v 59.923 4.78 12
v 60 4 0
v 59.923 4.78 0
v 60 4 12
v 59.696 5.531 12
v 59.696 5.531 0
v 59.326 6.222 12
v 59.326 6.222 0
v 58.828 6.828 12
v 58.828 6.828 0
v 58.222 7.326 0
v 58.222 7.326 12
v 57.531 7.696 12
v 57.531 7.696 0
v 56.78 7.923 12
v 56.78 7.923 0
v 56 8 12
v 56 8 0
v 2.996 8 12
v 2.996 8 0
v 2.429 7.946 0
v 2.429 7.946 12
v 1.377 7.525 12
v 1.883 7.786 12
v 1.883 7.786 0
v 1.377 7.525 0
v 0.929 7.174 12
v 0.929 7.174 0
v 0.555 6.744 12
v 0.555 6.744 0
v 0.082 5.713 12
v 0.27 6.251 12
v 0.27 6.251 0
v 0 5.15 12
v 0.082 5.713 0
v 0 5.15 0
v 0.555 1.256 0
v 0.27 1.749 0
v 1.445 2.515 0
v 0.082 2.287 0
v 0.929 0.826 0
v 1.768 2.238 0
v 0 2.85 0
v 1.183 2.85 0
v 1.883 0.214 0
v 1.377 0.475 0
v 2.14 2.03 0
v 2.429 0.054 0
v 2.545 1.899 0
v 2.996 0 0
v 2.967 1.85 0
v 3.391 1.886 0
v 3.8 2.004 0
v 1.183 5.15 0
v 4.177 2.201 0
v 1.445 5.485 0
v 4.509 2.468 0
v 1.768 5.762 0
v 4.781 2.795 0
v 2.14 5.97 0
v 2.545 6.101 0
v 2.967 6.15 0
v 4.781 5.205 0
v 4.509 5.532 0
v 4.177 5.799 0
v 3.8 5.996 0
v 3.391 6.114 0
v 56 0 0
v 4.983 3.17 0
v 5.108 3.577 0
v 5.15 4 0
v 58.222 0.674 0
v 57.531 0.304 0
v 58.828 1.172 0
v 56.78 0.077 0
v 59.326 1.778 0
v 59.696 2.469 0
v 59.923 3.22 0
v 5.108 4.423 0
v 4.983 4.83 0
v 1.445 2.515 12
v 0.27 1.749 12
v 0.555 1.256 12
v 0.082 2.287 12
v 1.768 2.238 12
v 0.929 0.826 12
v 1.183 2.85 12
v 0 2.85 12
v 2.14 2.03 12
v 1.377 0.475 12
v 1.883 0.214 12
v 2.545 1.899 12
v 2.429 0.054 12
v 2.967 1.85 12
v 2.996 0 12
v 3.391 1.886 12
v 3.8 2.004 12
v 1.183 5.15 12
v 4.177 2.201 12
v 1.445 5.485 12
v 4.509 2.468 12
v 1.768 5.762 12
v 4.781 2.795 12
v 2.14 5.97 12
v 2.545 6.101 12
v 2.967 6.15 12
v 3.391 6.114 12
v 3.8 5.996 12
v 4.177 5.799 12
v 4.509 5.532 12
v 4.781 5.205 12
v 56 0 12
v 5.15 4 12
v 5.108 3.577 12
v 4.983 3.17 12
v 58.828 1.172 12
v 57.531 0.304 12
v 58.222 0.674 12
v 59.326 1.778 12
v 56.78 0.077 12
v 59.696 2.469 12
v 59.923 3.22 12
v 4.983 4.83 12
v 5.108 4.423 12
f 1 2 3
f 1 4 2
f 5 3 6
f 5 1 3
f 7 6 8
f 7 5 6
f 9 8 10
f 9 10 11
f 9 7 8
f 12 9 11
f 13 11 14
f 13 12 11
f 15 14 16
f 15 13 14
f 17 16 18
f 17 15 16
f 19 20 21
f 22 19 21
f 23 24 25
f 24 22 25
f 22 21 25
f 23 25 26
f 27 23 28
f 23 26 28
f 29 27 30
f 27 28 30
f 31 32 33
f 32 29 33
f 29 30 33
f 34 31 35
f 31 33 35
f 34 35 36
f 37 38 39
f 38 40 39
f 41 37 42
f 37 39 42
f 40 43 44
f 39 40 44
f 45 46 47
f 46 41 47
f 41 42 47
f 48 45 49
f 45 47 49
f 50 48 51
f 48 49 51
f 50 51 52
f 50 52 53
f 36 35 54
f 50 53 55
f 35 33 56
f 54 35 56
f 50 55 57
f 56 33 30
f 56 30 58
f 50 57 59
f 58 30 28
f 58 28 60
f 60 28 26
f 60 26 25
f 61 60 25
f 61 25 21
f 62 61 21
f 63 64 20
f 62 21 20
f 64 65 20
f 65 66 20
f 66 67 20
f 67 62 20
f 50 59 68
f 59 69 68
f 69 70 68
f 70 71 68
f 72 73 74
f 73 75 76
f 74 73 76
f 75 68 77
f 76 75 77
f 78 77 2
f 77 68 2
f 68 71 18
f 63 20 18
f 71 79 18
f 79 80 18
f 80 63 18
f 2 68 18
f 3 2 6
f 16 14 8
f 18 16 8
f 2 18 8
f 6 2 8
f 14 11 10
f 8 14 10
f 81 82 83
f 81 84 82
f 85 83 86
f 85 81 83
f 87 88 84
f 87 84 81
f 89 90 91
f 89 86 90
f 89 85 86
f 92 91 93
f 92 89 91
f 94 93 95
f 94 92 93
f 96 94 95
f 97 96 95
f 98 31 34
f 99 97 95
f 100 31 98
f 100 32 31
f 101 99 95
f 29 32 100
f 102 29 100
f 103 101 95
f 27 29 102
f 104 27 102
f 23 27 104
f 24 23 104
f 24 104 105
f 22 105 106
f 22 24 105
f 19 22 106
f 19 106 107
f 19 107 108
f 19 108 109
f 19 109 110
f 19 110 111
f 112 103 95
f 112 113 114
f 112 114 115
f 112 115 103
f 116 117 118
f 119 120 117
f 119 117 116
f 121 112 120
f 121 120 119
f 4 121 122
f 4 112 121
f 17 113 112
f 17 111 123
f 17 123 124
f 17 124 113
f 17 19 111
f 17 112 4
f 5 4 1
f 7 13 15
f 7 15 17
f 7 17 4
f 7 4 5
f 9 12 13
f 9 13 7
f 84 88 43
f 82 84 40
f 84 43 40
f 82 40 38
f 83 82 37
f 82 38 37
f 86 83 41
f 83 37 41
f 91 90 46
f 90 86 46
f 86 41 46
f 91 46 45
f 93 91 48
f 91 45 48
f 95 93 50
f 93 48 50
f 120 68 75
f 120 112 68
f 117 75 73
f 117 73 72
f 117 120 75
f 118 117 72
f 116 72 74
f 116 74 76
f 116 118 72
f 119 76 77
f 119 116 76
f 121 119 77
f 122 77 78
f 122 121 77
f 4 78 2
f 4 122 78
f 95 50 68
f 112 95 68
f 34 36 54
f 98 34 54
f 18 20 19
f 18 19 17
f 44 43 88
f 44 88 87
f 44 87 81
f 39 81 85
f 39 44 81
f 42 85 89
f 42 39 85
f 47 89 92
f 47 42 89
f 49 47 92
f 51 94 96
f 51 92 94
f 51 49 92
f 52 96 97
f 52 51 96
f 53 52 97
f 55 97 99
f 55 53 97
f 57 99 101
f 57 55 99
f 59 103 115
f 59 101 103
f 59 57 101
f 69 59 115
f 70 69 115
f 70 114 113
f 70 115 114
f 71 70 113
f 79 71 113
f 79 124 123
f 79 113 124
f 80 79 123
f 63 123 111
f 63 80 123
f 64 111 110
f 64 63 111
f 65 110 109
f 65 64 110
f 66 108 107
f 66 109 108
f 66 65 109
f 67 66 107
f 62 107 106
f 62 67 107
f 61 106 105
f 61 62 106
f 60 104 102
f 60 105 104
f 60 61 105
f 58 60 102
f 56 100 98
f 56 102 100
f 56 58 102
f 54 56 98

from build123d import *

# Parameters (mm, degrees)
ESQUISSE1_W                  = 60
ESQUISSE1_H                  = 8
BOSS_EXTRU_1_DEPTH           = 12
ENL_V_MAT_EXTRU_1_DEPTH      = 62.708994482
ENL_V_MAT_EXTRU_1_DEPTH_BACK = 62.708994482
ESQUISSE2_R                  = 2.15
ENL_V_MAT_EXTRU_2_DEPTH      = 62.708994482
ENL_V_MAT_EXTRU_2_DEPTH_BACK = 62.708994482
ESQUISSE3_W                  = 2
ESQUISSE3_H                  = 2.3
CONG_1_R                     = 4
CONG_2_R                     = 3


# Some blends are built 0.0001 mm under size
with BuildPart() as part:
    # Esquisse1 → Boss.-Extru.1 (new body)
    with BuildSketch(Plane.XY):
        with Locations((30, 4)):
            Rectangle(ESQUISSE1_W, ESQUISSE1_H)
    extrude(amount=BOSS_EXTRU_1_DEPTH)

    # Esquisse2 → Enlèv. mat.-Extru.1 (cut, two sides: drawn at the far end of the back side and taken through both)
    with BuildSketch(Plane.XY.offset(12).offset(-ENL_V_MAT_EXTRU_1_DEPTH_BACK)):
        with Locations((3, 4)):
            Circle(ESQUISSE2_R)
    extrude(amount=ENL_V_MAT_EXTRU_1_DEPTH + ENL_V_MAT_EXTRU_1_DEPTH_BACK, mode=Mode.SUBTRACT)

    # Esquisse3 → Enlèv. mat.-Extru.2 (cut, two sides: drawn at the far end of the back side and taken through both)
    with BuildSketch(Plane.XY.offset(12).offset(-ENL_V_MAT_EXTRU_2_DEPTH_BACK)):
        with Locations((1, 4)):
            Rectangle(ESQUISSE3_W, ESQUISSE3_H)
    extrude(amount=ENL_V_MAT_EXTRU_2_DEPTH + ENL_V_MAT_EXTRU_2_DEPTH_BACK, mode=Mode.SUBTRACT)

    # Congé1
    cong_1_edges = [part.edges().sort_by_distance(p)[0] for p in [
        (60, 0, 6),
        (60, 8, 6),
    ]]
    fillet(cong_1_edges, radius=CONG_1_R - 0.0001)  # a hair under: the kernel refuses the full size

    # Congé2
    # the kernel refuses this fillet: 3 mm, written as the material it takes off along each edge
    with BuildSketch(Plane(origin=(0, 0, -7.490619133), x_dir=(1, 0, 0), z_dir=(0, 0, 1))) as cong_2_piece_1:
        with BuildLine():
            CenterArc((2.996247653, 3), CONG_2_R, 182.865983983, 87.134016017)
            Line((0, 2.85), (-0.059924953, 2.847))
            ThreePointArc((-0.059924953, 2.847), (-0.06, 1.425), (-0.06, 0))
            Line((-0.06, 0), (0, -0.06))
            Line((0, -0.06), (2.996247653, -0.06))
            Line((2.996247653, -0.06), (2.996247653, 0))
        make_face()
    extrude(amount=26.981238267, mode=Mode.SUBTRACT)
    with BuildSketch(Plane(origin=(0, 8, -7.490619133), x_dir=(1, 0, 0), z_dir=(0, 0, 1))) as cong_2_piece_2:
        with BuildLine():
            CenterArc((2.996247653, -3), CONG_2_R, 90, 87.134016017)
            Line((0, -2.85), (-0.059924953, -2.847))
            ThreePointArc((-0.059924953, -2.847), (-0.06, -1.425), (-0.06, 0))
            Line((-0.06, 0), (0, 0.06))
            Line((0, 0.06), (2.996247653, 0.06))
            Line((2.996247653, 0.06), (2.996247653, 0))
        make_face()
    extrude(amount=26.981238267, mode=Mode.SUBTRACT)


solid = part.part
